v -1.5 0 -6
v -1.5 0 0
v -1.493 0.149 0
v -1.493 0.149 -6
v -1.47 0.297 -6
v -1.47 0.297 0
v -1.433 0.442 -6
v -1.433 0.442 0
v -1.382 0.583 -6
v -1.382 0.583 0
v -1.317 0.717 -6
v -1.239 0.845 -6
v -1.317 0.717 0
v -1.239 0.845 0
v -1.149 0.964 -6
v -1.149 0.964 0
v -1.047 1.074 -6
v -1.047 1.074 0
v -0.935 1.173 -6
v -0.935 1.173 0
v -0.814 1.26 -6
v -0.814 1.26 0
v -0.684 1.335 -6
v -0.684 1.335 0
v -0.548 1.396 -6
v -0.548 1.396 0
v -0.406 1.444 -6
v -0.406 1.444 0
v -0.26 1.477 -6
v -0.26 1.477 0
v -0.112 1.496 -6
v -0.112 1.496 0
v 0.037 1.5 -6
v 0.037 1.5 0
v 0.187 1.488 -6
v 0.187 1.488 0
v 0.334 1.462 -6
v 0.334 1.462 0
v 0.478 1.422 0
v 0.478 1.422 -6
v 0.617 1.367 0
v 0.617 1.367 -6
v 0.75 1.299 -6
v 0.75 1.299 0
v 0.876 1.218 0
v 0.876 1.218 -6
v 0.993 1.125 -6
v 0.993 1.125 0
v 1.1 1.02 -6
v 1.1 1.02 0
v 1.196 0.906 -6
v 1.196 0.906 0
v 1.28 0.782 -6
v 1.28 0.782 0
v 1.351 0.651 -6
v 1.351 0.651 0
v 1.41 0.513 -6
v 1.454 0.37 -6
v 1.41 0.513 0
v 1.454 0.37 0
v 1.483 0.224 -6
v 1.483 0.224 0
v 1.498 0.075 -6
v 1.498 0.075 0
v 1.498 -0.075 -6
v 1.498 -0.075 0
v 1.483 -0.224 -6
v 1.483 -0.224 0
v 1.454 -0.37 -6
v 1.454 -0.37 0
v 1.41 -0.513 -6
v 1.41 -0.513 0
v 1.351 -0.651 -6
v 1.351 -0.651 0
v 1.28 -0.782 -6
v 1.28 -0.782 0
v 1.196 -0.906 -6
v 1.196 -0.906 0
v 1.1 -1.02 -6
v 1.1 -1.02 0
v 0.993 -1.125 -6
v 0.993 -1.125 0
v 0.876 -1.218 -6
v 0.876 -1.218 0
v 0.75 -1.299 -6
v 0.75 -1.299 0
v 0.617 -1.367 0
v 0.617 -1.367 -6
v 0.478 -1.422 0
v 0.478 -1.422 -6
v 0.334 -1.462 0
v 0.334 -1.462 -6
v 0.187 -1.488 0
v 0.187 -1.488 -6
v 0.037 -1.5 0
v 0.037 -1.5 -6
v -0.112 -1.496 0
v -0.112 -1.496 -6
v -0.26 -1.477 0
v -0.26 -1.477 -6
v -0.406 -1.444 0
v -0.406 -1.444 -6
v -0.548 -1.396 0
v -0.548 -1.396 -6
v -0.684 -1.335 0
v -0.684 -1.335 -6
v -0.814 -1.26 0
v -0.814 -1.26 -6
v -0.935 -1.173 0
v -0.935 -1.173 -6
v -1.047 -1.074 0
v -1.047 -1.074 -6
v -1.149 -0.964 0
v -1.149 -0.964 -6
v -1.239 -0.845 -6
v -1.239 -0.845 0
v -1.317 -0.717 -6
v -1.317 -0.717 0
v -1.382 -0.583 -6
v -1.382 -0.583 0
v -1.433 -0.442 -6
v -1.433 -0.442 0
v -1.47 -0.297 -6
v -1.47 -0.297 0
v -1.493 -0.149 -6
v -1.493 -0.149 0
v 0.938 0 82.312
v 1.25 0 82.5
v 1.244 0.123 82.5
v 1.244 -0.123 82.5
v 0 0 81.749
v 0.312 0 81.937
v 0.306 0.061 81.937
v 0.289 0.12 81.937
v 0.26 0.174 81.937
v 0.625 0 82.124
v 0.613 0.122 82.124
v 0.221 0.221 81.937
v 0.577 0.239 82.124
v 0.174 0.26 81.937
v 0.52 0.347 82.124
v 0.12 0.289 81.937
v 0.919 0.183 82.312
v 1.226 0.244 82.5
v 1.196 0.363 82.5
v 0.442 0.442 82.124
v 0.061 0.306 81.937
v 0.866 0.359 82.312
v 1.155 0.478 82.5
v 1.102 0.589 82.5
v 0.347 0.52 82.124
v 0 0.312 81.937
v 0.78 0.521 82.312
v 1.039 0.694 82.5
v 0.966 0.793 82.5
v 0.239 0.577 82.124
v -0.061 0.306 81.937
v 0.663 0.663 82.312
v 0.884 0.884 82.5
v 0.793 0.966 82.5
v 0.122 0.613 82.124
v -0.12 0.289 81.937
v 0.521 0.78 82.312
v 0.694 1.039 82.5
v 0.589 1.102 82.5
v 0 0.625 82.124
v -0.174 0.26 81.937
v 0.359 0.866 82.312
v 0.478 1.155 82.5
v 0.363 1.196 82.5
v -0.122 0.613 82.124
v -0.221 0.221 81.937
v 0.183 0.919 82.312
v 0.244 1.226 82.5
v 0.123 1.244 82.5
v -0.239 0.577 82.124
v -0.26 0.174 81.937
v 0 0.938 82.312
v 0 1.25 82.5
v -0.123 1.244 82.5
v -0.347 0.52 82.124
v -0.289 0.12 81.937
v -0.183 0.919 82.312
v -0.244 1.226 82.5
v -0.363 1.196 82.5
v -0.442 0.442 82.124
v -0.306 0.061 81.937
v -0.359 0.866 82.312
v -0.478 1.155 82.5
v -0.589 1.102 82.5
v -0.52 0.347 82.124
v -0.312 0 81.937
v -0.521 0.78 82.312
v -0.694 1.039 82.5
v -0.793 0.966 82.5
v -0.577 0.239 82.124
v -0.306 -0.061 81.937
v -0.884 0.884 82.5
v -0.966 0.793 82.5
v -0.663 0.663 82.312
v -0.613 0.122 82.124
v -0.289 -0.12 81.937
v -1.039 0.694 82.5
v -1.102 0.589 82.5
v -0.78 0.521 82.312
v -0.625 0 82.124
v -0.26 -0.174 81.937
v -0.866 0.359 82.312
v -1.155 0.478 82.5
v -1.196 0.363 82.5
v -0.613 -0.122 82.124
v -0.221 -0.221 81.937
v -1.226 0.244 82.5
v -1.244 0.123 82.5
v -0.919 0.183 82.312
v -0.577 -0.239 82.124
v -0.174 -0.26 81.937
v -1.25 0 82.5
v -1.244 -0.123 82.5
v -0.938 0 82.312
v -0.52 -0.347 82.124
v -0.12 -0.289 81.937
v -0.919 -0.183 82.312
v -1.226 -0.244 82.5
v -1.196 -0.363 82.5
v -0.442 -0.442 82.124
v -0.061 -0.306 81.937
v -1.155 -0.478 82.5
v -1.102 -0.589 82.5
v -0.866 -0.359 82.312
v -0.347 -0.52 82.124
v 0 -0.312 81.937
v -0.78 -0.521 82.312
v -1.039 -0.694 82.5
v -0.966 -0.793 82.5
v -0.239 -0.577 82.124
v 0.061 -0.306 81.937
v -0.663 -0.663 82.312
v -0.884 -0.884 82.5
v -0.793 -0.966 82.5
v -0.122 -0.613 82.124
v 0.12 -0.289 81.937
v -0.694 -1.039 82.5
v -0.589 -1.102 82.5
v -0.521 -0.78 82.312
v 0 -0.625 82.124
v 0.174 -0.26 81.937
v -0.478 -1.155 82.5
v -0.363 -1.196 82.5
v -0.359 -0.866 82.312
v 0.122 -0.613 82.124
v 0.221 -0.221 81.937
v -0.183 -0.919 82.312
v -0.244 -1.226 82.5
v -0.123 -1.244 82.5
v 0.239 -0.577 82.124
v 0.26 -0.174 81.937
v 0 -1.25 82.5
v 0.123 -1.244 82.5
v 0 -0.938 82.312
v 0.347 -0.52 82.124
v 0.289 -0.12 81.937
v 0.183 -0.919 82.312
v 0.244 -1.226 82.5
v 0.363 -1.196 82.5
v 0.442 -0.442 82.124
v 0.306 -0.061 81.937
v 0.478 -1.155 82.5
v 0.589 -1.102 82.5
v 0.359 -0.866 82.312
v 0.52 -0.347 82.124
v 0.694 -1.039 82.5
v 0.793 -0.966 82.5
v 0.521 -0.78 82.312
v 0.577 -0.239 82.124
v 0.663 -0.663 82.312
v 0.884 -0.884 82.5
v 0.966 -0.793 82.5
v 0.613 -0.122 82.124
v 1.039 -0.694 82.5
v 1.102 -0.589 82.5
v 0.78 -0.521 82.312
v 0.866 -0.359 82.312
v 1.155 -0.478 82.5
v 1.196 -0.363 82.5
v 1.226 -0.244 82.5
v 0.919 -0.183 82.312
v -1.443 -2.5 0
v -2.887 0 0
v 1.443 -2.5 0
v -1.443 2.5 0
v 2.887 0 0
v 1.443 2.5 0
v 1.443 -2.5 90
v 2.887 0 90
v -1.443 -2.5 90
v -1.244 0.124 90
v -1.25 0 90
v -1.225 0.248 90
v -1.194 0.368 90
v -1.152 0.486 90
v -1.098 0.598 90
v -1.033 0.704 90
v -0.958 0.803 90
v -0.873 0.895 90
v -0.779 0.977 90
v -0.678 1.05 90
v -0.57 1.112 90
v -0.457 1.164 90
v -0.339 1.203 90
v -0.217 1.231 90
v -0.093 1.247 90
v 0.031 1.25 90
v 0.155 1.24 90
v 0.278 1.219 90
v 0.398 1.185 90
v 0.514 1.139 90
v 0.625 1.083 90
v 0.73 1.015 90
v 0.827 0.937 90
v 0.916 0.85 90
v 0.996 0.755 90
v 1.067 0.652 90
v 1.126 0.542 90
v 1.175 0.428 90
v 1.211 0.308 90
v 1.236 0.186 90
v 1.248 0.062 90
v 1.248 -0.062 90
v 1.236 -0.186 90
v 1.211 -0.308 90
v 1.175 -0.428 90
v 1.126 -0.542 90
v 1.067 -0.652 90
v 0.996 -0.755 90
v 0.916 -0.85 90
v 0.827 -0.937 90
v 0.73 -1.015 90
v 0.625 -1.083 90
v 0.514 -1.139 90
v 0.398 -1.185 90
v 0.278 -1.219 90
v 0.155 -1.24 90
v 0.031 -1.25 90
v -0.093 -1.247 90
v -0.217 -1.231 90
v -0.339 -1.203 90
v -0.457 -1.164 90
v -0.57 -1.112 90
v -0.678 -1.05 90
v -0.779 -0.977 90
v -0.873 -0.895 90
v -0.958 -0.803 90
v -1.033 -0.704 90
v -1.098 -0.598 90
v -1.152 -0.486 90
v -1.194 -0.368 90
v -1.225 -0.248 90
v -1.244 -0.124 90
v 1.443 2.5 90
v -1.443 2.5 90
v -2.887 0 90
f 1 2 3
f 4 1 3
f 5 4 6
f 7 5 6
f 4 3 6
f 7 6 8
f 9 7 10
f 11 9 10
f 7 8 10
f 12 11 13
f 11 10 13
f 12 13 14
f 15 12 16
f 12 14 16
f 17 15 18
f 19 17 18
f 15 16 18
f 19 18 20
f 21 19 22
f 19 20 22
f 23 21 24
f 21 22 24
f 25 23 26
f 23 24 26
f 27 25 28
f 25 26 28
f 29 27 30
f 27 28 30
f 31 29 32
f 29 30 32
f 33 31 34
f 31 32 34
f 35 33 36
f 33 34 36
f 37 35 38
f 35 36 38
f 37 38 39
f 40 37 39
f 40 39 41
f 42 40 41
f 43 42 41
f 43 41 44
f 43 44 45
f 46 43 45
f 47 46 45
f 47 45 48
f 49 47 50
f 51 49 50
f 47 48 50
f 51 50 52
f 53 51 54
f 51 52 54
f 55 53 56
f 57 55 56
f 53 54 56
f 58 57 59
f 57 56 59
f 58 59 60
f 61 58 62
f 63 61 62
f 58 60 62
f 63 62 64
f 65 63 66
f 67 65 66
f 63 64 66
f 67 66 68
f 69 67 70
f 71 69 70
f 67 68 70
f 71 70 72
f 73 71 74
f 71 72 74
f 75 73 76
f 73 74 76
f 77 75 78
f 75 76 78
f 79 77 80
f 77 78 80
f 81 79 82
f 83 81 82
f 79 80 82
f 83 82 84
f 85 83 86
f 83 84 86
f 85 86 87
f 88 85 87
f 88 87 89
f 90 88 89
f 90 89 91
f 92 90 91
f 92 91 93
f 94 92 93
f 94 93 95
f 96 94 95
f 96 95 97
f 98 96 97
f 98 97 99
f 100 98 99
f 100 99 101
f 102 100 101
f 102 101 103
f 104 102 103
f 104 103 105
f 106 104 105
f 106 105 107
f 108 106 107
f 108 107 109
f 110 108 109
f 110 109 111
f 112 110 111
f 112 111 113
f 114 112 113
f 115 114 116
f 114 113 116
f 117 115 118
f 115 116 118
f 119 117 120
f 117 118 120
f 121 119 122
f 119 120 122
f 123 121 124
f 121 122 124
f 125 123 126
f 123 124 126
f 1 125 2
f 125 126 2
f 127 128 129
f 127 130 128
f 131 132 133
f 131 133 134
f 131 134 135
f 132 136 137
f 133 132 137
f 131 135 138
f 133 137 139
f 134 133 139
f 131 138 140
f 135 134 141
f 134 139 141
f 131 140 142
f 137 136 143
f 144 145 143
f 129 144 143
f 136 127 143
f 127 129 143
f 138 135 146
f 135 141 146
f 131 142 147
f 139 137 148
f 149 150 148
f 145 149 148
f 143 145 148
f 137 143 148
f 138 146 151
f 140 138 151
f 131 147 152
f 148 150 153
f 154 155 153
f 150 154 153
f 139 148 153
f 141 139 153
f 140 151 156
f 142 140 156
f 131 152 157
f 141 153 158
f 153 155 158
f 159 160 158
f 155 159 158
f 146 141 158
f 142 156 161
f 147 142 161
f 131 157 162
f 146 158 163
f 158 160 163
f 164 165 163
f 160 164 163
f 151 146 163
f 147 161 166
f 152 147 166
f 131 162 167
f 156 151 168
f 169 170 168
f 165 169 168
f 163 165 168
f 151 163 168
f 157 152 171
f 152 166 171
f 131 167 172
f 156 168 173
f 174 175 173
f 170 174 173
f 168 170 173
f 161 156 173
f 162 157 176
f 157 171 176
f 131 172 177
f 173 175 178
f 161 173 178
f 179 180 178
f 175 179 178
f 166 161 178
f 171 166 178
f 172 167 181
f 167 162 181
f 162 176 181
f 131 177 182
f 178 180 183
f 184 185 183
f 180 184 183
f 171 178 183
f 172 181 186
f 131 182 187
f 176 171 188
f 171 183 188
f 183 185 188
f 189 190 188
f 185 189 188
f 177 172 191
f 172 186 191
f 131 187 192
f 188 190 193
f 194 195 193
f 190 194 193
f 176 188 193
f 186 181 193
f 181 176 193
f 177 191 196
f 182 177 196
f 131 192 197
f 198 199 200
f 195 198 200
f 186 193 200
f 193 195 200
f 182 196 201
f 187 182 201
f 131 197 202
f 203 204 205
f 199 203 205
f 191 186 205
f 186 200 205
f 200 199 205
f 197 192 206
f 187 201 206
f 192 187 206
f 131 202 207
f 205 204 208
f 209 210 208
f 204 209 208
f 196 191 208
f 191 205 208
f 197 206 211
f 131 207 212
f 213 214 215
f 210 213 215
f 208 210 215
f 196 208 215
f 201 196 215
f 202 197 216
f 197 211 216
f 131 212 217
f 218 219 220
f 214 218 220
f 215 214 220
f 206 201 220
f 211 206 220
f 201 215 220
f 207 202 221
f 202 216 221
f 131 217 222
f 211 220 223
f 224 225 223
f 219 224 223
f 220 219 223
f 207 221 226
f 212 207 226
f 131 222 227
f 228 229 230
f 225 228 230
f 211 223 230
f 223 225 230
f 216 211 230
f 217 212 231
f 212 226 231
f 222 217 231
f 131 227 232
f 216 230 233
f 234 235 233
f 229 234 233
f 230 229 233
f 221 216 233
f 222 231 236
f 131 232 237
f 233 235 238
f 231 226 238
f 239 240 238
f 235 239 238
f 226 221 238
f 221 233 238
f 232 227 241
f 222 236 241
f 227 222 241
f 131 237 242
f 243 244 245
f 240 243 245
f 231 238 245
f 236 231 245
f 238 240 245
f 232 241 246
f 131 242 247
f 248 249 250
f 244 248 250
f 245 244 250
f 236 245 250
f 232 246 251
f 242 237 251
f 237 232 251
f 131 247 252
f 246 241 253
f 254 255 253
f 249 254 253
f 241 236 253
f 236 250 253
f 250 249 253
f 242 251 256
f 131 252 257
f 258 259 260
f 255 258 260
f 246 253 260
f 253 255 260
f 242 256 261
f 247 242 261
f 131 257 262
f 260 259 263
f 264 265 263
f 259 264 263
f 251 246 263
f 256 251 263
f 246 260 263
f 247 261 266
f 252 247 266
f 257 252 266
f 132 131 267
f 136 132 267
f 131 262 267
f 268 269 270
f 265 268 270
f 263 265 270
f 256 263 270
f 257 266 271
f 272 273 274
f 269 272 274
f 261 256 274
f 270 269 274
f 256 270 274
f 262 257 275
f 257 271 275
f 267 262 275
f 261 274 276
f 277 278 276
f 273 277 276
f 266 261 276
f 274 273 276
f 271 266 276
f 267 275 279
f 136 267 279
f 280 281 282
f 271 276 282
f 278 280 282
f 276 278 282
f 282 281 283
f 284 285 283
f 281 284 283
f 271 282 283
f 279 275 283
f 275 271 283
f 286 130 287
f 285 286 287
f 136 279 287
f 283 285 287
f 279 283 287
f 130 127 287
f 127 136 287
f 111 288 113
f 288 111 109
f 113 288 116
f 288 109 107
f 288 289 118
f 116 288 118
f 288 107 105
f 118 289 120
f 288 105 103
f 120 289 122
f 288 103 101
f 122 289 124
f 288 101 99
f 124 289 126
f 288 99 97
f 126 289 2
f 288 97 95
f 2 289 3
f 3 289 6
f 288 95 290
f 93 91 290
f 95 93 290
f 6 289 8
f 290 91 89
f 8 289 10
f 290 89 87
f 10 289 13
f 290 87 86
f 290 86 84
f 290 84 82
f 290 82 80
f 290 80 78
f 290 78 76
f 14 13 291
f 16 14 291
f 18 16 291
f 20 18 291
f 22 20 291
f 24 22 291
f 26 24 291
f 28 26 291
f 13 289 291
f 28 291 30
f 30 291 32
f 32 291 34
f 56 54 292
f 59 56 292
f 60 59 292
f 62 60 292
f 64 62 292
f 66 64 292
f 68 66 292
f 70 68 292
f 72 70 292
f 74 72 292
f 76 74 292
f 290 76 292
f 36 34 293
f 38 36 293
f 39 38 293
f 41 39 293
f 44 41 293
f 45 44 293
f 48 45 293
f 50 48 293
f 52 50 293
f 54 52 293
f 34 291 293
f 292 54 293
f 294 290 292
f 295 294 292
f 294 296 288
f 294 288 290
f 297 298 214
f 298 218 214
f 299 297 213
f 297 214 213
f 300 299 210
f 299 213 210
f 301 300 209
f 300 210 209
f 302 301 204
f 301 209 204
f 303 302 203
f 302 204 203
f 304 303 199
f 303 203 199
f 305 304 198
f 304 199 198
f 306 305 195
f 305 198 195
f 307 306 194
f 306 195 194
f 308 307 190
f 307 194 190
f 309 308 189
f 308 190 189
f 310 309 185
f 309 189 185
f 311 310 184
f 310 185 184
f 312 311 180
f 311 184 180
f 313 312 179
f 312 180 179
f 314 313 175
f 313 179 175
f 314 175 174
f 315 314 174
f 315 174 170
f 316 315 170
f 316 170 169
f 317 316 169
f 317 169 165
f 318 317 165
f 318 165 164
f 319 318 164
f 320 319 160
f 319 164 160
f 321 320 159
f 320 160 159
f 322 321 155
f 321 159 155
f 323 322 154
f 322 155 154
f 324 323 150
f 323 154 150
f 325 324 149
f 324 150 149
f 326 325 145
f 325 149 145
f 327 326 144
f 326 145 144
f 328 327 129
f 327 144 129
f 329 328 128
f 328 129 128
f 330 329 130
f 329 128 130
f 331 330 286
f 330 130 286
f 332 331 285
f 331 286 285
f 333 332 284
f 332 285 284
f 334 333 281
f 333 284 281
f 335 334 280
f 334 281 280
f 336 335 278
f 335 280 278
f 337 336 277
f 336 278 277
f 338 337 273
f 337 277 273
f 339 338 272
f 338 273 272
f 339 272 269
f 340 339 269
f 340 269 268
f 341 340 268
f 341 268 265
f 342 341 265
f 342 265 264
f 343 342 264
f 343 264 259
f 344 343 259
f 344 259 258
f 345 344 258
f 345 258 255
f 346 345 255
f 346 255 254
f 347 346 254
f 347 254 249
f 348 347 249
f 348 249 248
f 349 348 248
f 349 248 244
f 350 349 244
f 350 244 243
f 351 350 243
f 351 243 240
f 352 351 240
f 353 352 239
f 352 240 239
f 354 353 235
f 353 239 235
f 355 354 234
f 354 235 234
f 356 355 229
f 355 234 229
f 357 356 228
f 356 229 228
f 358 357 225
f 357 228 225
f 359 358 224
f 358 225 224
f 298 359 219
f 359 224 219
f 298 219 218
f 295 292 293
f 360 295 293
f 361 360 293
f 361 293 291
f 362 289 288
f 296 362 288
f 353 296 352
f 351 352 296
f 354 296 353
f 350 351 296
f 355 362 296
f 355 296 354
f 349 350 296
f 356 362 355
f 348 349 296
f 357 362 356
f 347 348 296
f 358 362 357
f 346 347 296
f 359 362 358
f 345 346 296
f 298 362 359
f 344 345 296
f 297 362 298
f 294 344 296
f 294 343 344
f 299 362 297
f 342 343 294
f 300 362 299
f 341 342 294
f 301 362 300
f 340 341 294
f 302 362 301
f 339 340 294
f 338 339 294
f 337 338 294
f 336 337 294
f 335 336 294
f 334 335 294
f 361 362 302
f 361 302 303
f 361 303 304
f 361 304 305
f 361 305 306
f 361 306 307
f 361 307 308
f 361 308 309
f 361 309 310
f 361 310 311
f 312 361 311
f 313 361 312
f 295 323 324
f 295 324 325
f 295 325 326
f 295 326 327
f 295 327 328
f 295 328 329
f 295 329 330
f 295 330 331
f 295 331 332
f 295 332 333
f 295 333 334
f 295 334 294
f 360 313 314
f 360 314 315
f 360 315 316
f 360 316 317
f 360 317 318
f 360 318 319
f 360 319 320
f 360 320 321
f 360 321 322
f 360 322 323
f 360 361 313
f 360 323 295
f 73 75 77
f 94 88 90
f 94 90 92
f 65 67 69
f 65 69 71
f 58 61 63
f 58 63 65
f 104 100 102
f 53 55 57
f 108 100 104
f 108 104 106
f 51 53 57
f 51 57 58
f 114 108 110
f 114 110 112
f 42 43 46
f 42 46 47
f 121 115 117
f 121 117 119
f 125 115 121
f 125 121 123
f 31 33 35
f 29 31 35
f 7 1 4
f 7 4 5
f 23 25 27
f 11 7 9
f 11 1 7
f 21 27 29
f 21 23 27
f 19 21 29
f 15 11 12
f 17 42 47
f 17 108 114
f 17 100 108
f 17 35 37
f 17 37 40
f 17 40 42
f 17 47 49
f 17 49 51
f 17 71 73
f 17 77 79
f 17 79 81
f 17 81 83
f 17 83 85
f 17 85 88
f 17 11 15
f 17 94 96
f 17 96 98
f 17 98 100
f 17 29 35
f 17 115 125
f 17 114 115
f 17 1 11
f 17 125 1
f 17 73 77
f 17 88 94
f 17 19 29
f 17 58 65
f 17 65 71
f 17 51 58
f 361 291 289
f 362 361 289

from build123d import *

# Parameters (mm, degrees)
EXTRUDE_1_DEPTH = 90
SKETCH_4_R      = 1.5
EXTRUDE_2_DEPTH = 6
M3X0_5_1_D      = 2.5
M3X0_5_1_DEPTH  = 7.5
M3X0_5_1_TIP    = 0.751075774


with BuildPart() as part:
    # 草圖1 → 填料-伸長1 (new body)
    with BuildSketch(Plane.XY):
        Polygon((-1.443375673, 2.5), (-2.886751346, 0), (-1.443375673, -2.5), (1.443375673, -2.5), (2.886751346, 0), (1.443375673, 2.5), align=None)
    extrude(amount=EXTRUDE_1_DEPTH)

    # 草圖4 → 填料-伸長2 (add)
    with BuildSketch(Plane(origin=(0, 0, 0), x_dir=(-1, 0, 0), z_dir=(0, 0, -1))):
        Circle(SKETCH_4_R)
    extrude(amount=EXTRUDE_2_DEPTH)

    # M3x0.5 螺紋孔1
    with Locations(Plane.XY.offset(90)):
        with Locations((0, 0)):
            Hole(M3X0_5_1_D / 2, depth=M3X0_5_1_DEPTH)
            with Locations((0, 0, -(M3X0_5_1_DEPTH + M3X0_5_1_TIP / 2))):  # 118° drill point
                Cone(0, M3X0_5_1_D / 2, M3X0_5_1_TIP, mode=Mode.SUBTRACT)


solid = part.part
